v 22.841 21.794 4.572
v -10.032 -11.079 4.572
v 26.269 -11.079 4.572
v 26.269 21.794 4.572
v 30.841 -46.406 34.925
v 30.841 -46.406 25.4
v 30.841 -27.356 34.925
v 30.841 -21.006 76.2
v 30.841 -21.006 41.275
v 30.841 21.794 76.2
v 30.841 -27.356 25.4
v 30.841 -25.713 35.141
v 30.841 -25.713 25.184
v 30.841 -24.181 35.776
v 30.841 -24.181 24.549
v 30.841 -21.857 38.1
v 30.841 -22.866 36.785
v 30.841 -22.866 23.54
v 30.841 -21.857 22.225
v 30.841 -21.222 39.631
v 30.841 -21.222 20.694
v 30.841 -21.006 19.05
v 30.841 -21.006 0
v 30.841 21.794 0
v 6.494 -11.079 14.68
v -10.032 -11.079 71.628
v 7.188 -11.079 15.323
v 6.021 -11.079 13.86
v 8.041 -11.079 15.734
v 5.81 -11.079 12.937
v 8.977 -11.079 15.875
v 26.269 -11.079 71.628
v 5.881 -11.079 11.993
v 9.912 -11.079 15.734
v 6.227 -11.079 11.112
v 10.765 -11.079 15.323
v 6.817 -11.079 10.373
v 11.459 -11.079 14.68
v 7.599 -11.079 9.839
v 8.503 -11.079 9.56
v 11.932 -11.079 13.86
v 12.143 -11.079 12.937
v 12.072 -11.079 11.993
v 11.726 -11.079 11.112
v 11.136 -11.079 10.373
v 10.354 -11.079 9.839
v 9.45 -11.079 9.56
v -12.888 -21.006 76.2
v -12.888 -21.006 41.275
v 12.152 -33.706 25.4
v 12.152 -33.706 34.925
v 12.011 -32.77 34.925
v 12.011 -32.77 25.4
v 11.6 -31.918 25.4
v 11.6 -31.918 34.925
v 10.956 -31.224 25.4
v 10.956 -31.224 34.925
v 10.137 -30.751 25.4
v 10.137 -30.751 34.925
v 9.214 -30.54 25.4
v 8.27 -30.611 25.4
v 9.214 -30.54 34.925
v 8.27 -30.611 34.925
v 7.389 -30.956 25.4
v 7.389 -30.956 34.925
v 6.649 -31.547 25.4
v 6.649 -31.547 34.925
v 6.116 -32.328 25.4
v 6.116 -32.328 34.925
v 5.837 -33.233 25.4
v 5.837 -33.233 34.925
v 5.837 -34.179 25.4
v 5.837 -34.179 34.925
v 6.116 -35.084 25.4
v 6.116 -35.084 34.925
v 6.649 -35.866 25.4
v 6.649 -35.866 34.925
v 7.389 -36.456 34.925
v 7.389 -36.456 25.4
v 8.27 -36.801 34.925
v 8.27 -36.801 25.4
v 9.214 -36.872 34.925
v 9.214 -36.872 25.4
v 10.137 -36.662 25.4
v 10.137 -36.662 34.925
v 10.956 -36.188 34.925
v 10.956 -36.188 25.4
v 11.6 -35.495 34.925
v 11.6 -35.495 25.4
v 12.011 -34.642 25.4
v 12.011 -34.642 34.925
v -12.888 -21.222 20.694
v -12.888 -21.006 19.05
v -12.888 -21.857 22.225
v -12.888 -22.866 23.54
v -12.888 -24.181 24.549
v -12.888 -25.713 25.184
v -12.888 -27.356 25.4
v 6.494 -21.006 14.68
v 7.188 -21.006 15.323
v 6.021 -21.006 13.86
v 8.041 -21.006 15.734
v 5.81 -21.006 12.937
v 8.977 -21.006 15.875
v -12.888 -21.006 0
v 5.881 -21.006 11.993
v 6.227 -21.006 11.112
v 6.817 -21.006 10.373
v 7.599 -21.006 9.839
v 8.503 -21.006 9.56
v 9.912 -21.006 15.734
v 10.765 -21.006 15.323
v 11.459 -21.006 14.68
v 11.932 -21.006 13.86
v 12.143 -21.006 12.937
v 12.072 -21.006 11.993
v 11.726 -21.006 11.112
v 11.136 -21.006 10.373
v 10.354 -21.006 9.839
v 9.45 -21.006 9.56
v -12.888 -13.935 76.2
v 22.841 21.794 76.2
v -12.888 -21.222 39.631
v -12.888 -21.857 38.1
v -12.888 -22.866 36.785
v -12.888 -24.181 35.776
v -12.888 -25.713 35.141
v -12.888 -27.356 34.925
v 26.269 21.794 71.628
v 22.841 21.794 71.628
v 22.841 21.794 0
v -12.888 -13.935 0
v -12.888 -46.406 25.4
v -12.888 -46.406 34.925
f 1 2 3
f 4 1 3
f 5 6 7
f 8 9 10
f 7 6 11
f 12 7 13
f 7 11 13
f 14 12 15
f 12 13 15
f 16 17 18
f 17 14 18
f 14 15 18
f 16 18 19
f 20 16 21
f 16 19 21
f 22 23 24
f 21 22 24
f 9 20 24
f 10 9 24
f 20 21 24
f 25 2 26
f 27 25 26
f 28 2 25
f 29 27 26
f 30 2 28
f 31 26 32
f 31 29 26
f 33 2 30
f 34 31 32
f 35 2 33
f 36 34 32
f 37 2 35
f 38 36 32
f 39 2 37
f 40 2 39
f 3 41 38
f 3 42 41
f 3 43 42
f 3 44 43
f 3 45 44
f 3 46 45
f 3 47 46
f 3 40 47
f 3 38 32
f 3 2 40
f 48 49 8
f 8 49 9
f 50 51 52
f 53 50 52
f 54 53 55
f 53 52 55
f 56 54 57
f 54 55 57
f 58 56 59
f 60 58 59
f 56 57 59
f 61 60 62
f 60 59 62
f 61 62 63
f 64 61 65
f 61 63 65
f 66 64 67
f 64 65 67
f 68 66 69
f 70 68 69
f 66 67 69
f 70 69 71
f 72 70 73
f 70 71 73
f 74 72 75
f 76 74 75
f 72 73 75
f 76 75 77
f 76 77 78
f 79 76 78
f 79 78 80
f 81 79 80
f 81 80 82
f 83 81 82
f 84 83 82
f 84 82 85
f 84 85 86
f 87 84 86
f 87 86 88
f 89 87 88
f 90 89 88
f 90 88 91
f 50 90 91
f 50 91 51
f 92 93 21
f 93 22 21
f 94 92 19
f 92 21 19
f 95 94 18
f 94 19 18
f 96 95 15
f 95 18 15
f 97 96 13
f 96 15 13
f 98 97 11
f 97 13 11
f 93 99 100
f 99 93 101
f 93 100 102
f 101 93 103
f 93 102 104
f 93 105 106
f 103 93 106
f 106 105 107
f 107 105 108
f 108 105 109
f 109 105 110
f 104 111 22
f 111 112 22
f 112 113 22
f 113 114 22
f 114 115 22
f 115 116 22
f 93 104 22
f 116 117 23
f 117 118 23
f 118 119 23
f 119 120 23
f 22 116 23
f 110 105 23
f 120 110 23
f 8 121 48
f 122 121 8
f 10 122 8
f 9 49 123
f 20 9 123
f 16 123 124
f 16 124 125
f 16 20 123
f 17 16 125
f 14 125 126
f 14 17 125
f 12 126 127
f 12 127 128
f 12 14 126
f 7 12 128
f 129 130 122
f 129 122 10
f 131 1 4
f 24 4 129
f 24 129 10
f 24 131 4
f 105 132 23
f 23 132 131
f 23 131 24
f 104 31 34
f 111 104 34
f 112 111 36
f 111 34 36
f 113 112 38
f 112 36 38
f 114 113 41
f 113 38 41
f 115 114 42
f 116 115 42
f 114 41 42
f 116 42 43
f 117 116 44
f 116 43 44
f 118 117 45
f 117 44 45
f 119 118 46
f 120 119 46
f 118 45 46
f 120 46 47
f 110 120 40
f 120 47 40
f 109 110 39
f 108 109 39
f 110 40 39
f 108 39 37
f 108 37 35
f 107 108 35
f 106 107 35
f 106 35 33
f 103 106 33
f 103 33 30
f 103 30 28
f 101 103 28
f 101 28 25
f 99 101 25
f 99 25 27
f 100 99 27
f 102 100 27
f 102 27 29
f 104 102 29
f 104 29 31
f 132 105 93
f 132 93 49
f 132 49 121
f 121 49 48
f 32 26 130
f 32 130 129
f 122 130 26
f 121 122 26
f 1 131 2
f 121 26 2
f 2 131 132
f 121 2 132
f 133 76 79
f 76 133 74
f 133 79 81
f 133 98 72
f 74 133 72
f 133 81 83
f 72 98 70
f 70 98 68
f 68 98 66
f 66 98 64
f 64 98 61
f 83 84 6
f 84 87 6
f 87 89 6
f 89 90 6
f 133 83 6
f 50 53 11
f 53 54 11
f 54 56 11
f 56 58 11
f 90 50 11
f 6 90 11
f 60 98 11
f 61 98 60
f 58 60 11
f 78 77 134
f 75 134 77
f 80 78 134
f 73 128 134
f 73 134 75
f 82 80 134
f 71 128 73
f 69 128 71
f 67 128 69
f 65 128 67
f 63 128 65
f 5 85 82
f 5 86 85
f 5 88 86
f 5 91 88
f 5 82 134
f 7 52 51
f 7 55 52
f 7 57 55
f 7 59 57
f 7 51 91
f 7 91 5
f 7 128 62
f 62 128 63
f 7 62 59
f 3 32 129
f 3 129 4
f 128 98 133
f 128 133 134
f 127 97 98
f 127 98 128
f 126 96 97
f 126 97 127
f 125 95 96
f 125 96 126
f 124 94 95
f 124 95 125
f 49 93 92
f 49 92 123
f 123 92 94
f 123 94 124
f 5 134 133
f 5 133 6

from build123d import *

# Parameters (mm, degrees)
BOSS_EXTRUDE1_DEPTH     = 76.2
CUT_EXTRUDE1_DEPTH      = 32
CUT_EXTRUDE1_DEPTH_BACK = 11.07899994
SKETCH2_W               = 46.228
SKETCH2_H               = 67.056
CHAMFER2_SIZE           = 11.313708499
CHAMFER2_SIZE_2         = 8
CHAMFER3_SIZE           = 10
CHAMFER3_SIZE2          = 7.071067812
SKETCH3_R               = 3.175
CUT_EXTRUDE2_DEPTH      = 89.533824561
SKETCH8_W               = 43.728932188
SKETCH8_H               = 9.525
BOSS_EXTRUDE3_DEPTH     = 25.4
SKETCH9_R               = 3.175
CUT_EXTRUDE3_DEPTH      = 70.342045029
FILLET2_R               = 6.35


with BuildPart() as part:
    # Sketch1 → Boss-Extrude1 (new body)
    with BuildSketch(Plane.XY):
        Polygon((30.841032184, 29.793919389), (-19.958967816, -21.006080611), (30.841032184, -21.006080611), align=None)
    extrude(amount=BOSS_EXTRUDE1_DEPTH)

    # Sketch2 → Cut-Extrude1 (cut, two sides: drawn at the far end of the back side and taken through both)
    with BuildSketch(Plane(origin=(0, 0, 0), x_dir=(1, 0, 0), z_dir=(0, 1, 0)).offset(-CUT_EXTRUDE1_DEPTH_BACK)):
        with Locations((3.155032184, -38.1)):
            Rectangle(SKETCH2_W, SKETCH2_H)
    extrude(amount=CUT_EXTRUDE1_DEPTH + CUT_EXTRUDE1_DEPTH_BACK, mode=Mode.SUBTRACT)

    # Chamfer2
    # the kernel refuses this chamfer: 11.313708499, 8 mm, written as the material it takes off along each edge
    with BuildSketch(Plane(origin=(30.841032184, 29.793919389, -29.095271678), x_dir=(-0.7262819568766876, -0.6873969152646594, 0), z_dir=(0, 0, 1))) as chamfer2_piece_1:
        Polygon((CHAMFER2_SIZE * 0.99962191691, CHAMFER2_SIZE * 0.0274958766105), (CHAMFER2_SIZE_2 * 0.687396915265, CHAMFER2_SIZE_2 * 0.726281956877), (0, 0), align=None)
    extrude(amount=134.390543355, mode=Mode.SUBTRACT)

    # Chamfer3
    chamfer3_edges = [part.edges().sort_by_distance(p)[0] for p in [
        (-19.958967816, -21.006080611, 38.1),
    ]]
    chamfer3_side = [part.faces().sort_by_distance(p)[0] for p in [
        (1.441032184, 0.393919389, 0.973145416),
    ]]
    chamfer(chamfer3_edges, length=CHAMFER3_SIZE, length2=CHAMFER3_SIZE2, reference=chamfer3_side[0])

    # Sketch3 → Cut-Extrude2 (cut, through all)
    with BuildSketch(Plane(origin=(0, -11.07899994, 0), x_dir=(1, 0, 0), z_dir=(0, 1, 0))):
        with Locations(Location((8.97656609, -12.7, 0), (0, 0, 270))):
            Circle(SKETCH3_R)
    extrude(amount=-CUT_EXTRUDE2_DEPTH, mode=Mode.SUBTRACT)

    # Sketch8 → Boss-Extrude3 (add)
    with BuildSketch(Plane.XZ.offset(21.006080611)):
        with Locations((8.97656609, 30.1625)):
            Rectangle(SKETCH8_W, SKETCH8_H)
    extrude(amount=BOSS_EXTRUDE3_DEPTH)

    # Sketch9 → Cut-Extrude3 (cut, through all)
    with BuildSketch(Plane.XY.offset(34.925)):
        with Locations((8.97656609, -33.706080611)):
            Circle(SKETCH9_R)
    extrude(amount=-CUT_EXTRUDE3_DEPTH, mode=Mode.SUBTRACT)

    # Fillet2
    fillet2_edges = [part.edges().sort_by_distance(p)[0] for p in [
        (8.97656609, -21.006080611, 34.925),
        (8.97656609, -21.006080611, 25.4),
    ]]
    fillet(fillet2_edges, radius=FILLET2_R)


solid = part.part
